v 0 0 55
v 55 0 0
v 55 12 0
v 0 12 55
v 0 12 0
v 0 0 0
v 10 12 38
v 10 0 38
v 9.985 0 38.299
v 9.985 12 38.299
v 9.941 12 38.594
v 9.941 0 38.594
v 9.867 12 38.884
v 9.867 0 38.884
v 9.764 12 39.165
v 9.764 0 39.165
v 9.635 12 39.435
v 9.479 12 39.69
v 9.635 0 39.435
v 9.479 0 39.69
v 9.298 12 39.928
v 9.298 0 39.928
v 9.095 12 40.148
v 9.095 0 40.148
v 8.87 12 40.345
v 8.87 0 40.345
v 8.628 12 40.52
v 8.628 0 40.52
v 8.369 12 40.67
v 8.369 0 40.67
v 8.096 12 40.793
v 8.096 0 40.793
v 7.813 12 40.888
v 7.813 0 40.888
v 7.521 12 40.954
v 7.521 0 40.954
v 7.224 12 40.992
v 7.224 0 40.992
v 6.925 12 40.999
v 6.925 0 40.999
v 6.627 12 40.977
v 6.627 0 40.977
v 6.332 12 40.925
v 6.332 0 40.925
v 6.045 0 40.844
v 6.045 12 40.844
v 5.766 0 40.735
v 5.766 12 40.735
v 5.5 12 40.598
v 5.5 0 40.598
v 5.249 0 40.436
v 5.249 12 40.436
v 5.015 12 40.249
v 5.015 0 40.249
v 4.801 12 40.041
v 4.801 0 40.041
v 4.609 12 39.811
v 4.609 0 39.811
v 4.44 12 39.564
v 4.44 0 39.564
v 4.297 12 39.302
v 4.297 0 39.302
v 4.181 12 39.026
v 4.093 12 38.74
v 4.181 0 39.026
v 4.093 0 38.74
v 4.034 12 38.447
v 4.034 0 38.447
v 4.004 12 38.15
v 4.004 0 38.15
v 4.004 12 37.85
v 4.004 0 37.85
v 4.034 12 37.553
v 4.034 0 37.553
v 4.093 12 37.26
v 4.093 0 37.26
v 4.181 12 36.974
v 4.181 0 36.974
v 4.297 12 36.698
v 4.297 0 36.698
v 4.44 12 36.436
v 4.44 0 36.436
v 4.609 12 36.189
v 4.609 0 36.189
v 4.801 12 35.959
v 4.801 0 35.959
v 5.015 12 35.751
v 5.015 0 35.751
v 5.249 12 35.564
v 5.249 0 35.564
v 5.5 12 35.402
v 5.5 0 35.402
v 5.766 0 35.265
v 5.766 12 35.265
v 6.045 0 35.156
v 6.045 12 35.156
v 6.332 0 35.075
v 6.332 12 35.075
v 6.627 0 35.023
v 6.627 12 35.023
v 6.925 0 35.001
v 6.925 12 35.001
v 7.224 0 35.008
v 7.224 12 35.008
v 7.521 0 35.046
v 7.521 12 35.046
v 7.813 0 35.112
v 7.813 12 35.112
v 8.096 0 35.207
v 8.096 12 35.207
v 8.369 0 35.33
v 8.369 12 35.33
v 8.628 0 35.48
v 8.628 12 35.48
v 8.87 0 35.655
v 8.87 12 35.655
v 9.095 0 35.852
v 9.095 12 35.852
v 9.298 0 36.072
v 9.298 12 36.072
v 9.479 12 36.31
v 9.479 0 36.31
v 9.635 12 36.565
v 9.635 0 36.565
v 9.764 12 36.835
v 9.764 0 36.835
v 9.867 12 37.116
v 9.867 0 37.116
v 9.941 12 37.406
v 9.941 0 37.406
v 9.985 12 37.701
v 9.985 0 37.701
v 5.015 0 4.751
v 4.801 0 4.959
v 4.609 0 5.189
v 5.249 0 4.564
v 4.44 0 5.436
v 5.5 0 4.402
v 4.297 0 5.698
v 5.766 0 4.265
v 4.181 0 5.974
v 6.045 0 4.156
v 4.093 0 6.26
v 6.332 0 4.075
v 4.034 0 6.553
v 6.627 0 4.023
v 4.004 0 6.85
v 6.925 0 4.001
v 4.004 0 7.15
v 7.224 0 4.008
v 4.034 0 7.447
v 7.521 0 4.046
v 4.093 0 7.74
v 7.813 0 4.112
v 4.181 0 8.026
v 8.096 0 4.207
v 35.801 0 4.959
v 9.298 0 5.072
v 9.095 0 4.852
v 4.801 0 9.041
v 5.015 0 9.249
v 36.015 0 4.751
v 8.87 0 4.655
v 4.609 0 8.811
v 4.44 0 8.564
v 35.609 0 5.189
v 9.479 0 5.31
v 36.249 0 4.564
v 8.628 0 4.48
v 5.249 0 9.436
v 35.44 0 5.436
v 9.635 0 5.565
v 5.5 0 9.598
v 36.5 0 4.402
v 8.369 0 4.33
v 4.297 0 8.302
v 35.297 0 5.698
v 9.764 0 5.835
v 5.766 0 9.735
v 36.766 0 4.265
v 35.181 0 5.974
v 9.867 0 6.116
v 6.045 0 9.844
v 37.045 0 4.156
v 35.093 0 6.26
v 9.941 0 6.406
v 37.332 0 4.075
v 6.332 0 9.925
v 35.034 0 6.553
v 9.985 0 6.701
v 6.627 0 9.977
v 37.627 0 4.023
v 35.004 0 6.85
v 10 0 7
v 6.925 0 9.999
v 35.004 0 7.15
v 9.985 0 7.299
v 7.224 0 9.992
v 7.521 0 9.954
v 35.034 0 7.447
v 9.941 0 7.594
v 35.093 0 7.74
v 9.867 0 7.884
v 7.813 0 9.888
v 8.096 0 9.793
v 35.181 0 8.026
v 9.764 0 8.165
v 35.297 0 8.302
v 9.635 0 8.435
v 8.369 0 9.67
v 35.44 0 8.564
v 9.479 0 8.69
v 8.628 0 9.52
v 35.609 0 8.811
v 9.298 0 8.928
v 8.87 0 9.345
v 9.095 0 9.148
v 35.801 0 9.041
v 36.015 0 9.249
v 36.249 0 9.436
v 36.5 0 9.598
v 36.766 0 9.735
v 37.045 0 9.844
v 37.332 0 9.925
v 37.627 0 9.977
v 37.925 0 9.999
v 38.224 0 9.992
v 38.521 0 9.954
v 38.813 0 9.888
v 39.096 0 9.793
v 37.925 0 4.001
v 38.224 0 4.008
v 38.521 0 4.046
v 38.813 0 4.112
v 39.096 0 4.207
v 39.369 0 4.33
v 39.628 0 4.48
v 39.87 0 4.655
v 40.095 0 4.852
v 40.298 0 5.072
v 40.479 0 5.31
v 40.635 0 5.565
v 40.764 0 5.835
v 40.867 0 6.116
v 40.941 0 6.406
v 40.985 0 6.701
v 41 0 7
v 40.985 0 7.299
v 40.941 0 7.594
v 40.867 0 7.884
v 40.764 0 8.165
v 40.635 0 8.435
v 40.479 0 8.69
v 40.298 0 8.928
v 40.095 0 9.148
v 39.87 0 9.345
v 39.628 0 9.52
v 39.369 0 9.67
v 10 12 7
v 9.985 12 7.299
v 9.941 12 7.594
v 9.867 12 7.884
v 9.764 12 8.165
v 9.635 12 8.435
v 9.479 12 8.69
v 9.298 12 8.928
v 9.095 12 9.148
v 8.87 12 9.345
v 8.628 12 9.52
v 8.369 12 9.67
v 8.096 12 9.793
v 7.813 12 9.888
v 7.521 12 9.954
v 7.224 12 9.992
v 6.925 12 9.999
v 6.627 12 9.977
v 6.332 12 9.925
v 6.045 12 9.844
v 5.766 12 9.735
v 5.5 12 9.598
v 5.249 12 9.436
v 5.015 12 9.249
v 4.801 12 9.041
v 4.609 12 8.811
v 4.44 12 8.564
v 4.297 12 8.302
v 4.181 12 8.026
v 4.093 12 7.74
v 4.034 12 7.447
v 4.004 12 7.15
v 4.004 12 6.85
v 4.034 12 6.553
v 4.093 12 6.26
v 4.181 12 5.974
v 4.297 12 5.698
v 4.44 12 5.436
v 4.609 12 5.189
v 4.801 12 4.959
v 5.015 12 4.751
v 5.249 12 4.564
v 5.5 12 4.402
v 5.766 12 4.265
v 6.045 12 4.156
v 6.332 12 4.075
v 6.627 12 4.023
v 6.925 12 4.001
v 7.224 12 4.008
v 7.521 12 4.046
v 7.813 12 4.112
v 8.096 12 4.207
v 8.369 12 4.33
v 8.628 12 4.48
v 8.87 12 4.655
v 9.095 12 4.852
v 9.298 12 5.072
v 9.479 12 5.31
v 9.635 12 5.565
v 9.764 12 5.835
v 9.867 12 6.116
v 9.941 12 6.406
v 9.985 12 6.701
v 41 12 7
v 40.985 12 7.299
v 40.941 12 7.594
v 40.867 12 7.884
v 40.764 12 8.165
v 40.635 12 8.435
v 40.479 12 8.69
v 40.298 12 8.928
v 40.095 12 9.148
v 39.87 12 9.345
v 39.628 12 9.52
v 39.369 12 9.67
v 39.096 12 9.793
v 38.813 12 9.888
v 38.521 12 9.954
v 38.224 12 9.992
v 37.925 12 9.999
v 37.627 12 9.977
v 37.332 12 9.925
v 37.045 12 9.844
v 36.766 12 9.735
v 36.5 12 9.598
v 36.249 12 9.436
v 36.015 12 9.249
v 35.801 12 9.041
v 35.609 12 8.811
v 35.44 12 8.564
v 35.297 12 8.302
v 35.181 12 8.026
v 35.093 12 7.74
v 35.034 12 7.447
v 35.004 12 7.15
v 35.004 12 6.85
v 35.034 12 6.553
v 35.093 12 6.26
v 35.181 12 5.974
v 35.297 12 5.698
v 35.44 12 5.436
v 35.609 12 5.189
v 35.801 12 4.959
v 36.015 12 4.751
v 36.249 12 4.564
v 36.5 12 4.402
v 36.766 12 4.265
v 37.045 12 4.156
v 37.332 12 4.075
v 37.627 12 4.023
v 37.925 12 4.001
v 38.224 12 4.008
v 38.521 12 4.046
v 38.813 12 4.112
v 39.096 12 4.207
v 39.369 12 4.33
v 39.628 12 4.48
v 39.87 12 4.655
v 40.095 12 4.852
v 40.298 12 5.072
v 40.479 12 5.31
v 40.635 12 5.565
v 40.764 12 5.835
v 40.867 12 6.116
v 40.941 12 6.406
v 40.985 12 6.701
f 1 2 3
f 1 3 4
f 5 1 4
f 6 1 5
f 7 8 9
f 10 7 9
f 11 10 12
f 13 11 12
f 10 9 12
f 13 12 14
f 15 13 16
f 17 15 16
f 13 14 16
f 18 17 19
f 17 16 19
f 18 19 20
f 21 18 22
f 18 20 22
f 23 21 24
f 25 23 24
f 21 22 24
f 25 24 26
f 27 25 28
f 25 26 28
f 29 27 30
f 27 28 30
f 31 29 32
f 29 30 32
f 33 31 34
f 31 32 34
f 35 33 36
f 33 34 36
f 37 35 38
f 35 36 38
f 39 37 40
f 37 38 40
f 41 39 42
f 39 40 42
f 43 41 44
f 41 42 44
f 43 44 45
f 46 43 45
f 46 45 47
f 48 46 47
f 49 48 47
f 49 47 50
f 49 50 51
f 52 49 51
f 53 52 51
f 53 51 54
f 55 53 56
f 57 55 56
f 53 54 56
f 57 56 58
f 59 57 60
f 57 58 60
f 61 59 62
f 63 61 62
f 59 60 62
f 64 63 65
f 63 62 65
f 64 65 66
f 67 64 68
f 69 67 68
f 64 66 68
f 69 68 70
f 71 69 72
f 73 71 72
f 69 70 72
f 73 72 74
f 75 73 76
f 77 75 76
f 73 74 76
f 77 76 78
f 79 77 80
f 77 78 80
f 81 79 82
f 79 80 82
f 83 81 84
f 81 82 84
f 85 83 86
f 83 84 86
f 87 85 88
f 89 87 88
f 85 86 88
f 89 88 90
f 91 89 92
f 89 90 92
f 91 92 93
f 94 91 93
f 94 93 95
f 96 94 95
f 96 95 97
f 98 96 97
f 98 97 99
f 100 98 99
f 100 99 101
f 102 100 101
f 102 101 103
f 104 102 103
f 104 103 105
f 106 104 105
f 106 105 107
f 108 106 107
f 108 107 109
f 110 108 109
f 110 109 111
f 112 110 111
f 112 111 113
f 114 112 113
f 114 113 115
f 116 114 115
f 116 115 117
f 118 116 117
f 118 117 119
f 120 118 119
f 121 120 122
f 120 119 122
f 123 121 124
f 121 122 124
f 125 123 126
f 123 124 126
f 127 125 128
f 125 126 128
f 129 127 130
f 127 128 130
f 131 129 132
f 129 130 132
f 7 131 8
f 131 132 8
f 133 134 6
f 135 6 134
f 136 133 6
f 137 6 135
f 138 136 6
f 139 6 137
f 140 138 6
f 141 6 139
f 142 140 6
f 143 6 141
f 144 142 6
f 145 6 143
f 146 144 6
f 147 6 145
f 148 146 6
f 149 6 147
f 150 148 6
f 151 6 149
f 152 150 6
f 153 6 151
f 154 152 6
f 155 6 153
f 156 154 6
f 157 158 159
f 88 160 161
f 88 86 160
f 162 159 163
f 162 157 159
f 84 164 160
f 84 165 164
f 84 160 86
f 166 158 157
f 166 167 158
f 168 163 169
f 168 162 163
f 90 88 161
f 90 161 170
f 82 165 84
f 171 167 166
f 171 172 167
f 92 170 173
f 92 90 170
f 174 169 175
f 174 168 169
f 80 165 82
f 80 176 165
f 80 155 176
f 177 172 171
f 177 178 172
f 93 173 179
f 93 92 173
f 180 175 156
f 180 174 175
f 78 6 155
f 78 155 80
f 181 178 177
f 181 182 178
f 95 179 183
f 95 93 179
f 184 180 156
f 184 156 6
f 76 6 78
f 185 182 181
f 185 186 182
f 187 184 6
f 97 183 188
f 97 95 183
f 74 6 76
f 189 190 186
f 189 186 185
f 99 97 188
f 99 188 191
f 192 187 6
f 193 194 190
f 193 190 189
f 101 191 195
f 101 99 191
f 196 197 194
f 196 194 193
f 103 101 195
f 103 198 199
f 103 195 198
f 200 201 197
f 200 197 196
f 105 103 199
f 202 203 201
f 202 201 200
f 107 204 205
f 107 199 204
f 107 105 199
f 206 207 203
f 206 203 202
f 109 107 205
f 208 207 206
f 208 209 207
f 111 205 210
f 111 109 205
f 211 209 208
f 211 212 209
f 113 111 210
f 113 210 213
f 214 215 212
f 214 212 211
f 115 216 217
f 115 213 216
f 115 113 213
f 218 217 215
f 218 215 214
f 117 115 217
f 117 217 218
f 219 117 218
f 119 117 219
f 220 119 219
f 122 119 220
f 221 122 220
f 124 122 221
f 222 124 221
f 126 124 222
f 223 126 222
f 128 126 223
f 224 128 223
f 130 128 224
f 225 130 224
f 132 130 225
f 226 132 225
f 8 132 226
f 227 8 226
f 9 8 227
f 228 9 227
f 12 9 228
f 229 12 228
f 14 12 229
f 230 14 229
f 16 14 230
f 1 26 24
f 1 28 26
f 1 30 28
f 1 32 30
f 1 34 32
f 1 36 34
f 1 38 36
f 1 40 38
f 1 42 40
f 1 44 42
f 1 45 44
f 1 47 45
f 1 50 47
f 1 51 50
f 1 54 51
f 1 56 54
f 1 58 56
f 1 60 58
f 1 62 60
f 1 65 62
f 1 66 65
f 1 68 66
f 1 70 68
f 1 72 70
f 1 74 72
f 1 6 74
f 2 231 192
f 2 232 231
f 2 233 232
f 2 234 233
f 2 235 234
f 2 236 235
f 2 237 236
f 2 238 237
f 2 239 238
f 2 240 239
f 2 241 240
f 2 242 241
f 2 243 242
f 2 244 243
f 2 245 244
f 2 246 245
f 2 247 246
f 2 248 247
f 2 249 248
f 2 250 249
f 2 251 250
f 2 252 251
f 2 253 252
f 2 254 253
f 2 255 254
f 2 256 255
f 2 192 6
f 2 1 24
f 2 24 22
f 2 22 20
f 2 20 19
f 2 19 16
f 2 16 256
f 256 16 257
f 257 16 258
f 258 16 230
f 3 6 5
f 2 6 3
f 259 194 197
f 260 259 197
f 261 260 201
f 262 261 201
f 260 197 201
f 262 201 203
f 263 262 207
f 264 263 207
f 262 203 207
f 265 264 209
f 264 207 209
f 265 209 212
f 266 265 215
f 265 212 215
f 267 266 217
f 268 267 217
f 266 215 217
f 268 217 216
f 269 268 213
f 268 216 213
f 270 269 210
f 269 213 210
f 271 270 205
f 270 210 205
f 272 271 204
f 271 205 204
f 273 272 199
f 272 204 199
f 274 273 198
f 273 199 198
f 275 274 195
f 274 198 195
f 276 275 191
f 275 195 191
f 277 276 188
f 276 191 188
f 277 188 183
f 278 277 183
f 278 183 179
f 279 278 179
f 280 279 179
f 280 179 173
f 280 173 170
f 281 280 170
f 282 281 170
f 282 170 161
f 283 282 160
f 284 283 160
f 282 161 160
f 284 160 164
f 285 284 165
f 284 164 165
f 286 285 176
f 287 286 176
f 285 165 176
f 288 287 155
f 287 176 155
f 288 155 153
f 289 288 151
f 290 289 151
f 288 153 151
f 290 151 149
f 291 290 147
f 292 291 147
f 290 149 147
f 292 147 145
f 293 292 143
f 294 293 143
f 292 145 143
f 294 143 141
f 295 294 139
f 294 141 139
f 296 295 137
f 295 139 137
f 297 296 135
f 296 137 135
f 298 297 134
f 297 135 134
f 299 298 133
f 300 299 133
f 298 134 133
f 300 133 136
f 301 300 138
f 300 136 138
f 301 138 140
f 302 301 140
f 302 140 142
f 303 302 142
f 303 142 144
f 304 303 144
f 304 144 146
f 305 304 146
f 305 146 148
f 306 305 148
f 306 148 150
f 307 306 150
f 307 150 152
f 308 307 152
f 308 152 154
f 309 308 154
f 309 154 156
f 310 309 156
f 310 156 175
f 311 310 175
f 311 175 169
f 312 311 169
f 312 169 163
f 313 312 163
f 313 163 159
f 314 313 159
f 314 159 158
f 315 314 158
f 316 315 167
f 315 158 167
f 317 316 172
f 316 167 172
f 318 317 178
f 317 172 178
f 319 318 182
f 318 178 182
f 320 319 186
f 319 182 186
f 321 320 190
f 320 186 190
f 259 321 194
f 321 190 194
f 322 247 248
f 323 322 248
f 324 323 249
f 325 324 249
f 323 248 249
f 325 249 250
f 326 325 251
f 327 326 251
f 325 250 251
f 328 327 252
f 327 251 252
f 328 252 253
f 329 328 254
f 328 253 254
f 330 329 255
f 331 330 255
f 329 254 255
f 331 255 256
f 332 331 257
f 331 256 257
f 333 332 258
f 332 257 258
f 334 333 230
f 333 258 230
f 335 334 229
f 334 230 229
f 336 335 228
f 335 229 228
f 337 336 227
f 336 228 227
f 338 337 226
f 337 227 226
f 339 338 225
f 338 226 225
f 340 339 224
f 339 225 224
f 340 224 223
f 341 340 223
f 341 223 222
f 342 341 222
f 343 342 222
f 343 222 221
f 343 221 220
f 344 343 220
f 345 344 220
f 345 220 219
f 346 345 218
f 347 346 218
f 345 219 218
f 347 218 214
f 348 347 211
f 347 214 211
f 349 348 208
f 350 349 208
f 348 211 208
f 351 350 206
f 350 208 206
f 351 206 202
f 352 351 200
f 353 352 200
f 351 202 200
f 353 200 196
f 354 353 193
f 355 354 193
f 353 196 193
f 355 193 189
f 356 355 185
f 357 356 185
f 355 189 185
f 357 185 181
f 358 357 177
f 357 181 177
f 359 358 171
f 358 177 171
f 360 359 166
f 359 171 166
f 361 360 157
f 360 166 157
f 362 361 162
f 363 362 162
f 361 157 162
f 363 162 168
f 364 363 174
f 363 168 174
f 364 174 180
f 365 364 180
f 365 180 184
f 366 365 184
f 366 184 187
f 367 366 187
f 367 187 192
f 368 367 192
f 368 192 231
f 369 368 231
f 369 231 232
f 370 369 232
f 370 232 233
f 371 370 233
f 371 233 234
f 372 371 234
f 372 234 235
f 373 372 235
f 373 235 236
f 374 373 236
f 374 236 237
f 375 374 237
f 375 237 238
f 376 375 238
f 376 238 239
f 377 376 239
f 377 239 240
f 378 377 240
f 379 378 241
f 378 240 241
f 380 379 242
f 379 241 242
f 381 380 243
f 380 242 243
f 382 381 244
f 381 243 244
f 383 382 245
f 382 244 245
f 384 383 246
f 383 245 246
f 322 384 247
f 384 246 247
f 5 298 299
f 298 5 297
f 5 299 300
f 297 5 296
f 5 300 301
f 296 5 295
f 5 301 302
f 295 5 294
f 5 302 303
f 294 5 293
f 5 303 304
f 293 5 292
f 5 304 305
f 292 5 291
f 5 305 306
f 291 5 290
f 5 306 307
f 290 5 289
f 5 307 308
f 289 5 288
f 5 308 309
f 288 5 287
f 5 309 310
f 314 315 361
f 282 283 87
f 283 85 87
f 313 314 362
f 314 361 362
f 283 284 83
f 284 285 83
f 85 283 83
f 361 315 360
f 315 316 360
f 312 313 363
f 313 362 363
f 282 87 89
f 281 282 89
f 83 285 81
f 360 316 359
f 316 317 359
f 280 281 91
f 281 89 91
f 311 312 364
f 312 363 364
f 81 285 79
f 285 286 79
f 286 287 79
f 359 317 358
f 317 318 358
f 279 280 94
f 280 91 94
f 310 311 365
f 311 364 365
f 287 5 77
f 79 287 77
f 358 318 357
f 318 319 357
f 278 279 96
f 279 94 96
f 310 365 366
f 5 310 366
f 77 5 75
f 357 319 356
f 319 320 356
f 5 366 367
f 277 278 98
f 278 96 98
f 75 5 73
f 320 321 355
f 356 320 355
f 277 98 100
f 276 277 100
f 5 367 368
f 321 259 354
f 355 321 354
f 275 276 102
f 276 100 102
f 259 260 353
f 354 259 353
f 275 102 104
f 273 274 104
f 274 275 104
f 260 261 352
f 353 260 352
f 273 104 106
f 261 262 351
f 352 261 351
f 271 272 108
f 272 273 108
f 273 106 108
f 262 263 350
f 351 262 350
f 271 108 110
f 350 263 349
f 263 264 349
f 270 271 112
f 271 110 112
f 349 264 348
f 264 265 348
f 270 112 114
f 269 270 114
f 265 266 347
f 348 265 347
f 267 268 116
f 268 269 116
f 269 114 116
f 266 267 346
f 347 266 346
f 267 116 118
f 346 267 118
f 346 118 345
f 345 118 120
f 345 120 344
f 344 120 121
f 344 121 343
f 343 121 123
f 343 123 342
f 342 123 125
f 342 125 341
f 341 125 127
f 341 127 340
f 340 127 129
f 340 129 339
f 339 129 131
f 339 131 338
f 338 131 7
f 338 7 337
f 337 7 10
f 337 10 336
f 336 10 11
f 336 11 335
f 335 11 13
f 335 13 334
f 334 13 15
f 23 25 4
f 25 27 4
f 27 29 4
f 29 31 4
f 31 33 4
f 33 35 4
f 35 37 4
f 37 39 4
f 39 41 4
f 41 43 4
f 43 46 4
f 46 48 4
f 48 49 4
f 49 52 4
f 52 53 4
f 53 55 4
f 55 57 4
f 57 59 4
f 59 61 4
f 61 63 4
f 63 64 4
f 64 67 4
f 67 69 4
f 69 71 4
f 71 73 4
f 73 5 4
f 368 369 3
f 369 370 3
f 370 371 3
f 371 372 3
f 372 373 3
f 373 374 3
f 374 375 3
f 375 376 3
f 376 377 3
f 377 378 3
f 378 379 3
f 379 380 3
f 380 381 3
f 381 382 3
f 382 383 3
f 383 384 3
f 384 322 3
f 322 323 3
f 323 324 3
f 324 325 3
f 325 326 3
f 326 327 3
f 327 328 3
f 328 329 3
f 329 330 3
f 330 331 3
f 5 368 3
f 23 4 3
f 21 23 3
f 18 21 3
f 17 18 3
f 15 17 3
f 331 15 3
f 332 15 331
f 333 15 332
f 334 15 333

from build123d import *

# Parameters (mm, degrees)
F0_R     = 3
F1_DEPTH = 12


with BuildPart() as f1:
    # F0 (on Front) → F1 (new body)
    with BuildSketch(Plane.XZ):
        Polygon((0, 55), (0, 0), (55, 0), align=None)
        with Locations((7, 7)):
            Circle(F0_R, mode=Mode.SUBTRACT)
        with Locations((38, 7)):
            Circle(F0_R, mode=Mode.SUBTRACT)
        with Locations((7, 38)):
            Circle(F0_R, mode=Mode.SUBTRACT)
    extrude(amount=-F1_DEPTH)


solid = f1.part
